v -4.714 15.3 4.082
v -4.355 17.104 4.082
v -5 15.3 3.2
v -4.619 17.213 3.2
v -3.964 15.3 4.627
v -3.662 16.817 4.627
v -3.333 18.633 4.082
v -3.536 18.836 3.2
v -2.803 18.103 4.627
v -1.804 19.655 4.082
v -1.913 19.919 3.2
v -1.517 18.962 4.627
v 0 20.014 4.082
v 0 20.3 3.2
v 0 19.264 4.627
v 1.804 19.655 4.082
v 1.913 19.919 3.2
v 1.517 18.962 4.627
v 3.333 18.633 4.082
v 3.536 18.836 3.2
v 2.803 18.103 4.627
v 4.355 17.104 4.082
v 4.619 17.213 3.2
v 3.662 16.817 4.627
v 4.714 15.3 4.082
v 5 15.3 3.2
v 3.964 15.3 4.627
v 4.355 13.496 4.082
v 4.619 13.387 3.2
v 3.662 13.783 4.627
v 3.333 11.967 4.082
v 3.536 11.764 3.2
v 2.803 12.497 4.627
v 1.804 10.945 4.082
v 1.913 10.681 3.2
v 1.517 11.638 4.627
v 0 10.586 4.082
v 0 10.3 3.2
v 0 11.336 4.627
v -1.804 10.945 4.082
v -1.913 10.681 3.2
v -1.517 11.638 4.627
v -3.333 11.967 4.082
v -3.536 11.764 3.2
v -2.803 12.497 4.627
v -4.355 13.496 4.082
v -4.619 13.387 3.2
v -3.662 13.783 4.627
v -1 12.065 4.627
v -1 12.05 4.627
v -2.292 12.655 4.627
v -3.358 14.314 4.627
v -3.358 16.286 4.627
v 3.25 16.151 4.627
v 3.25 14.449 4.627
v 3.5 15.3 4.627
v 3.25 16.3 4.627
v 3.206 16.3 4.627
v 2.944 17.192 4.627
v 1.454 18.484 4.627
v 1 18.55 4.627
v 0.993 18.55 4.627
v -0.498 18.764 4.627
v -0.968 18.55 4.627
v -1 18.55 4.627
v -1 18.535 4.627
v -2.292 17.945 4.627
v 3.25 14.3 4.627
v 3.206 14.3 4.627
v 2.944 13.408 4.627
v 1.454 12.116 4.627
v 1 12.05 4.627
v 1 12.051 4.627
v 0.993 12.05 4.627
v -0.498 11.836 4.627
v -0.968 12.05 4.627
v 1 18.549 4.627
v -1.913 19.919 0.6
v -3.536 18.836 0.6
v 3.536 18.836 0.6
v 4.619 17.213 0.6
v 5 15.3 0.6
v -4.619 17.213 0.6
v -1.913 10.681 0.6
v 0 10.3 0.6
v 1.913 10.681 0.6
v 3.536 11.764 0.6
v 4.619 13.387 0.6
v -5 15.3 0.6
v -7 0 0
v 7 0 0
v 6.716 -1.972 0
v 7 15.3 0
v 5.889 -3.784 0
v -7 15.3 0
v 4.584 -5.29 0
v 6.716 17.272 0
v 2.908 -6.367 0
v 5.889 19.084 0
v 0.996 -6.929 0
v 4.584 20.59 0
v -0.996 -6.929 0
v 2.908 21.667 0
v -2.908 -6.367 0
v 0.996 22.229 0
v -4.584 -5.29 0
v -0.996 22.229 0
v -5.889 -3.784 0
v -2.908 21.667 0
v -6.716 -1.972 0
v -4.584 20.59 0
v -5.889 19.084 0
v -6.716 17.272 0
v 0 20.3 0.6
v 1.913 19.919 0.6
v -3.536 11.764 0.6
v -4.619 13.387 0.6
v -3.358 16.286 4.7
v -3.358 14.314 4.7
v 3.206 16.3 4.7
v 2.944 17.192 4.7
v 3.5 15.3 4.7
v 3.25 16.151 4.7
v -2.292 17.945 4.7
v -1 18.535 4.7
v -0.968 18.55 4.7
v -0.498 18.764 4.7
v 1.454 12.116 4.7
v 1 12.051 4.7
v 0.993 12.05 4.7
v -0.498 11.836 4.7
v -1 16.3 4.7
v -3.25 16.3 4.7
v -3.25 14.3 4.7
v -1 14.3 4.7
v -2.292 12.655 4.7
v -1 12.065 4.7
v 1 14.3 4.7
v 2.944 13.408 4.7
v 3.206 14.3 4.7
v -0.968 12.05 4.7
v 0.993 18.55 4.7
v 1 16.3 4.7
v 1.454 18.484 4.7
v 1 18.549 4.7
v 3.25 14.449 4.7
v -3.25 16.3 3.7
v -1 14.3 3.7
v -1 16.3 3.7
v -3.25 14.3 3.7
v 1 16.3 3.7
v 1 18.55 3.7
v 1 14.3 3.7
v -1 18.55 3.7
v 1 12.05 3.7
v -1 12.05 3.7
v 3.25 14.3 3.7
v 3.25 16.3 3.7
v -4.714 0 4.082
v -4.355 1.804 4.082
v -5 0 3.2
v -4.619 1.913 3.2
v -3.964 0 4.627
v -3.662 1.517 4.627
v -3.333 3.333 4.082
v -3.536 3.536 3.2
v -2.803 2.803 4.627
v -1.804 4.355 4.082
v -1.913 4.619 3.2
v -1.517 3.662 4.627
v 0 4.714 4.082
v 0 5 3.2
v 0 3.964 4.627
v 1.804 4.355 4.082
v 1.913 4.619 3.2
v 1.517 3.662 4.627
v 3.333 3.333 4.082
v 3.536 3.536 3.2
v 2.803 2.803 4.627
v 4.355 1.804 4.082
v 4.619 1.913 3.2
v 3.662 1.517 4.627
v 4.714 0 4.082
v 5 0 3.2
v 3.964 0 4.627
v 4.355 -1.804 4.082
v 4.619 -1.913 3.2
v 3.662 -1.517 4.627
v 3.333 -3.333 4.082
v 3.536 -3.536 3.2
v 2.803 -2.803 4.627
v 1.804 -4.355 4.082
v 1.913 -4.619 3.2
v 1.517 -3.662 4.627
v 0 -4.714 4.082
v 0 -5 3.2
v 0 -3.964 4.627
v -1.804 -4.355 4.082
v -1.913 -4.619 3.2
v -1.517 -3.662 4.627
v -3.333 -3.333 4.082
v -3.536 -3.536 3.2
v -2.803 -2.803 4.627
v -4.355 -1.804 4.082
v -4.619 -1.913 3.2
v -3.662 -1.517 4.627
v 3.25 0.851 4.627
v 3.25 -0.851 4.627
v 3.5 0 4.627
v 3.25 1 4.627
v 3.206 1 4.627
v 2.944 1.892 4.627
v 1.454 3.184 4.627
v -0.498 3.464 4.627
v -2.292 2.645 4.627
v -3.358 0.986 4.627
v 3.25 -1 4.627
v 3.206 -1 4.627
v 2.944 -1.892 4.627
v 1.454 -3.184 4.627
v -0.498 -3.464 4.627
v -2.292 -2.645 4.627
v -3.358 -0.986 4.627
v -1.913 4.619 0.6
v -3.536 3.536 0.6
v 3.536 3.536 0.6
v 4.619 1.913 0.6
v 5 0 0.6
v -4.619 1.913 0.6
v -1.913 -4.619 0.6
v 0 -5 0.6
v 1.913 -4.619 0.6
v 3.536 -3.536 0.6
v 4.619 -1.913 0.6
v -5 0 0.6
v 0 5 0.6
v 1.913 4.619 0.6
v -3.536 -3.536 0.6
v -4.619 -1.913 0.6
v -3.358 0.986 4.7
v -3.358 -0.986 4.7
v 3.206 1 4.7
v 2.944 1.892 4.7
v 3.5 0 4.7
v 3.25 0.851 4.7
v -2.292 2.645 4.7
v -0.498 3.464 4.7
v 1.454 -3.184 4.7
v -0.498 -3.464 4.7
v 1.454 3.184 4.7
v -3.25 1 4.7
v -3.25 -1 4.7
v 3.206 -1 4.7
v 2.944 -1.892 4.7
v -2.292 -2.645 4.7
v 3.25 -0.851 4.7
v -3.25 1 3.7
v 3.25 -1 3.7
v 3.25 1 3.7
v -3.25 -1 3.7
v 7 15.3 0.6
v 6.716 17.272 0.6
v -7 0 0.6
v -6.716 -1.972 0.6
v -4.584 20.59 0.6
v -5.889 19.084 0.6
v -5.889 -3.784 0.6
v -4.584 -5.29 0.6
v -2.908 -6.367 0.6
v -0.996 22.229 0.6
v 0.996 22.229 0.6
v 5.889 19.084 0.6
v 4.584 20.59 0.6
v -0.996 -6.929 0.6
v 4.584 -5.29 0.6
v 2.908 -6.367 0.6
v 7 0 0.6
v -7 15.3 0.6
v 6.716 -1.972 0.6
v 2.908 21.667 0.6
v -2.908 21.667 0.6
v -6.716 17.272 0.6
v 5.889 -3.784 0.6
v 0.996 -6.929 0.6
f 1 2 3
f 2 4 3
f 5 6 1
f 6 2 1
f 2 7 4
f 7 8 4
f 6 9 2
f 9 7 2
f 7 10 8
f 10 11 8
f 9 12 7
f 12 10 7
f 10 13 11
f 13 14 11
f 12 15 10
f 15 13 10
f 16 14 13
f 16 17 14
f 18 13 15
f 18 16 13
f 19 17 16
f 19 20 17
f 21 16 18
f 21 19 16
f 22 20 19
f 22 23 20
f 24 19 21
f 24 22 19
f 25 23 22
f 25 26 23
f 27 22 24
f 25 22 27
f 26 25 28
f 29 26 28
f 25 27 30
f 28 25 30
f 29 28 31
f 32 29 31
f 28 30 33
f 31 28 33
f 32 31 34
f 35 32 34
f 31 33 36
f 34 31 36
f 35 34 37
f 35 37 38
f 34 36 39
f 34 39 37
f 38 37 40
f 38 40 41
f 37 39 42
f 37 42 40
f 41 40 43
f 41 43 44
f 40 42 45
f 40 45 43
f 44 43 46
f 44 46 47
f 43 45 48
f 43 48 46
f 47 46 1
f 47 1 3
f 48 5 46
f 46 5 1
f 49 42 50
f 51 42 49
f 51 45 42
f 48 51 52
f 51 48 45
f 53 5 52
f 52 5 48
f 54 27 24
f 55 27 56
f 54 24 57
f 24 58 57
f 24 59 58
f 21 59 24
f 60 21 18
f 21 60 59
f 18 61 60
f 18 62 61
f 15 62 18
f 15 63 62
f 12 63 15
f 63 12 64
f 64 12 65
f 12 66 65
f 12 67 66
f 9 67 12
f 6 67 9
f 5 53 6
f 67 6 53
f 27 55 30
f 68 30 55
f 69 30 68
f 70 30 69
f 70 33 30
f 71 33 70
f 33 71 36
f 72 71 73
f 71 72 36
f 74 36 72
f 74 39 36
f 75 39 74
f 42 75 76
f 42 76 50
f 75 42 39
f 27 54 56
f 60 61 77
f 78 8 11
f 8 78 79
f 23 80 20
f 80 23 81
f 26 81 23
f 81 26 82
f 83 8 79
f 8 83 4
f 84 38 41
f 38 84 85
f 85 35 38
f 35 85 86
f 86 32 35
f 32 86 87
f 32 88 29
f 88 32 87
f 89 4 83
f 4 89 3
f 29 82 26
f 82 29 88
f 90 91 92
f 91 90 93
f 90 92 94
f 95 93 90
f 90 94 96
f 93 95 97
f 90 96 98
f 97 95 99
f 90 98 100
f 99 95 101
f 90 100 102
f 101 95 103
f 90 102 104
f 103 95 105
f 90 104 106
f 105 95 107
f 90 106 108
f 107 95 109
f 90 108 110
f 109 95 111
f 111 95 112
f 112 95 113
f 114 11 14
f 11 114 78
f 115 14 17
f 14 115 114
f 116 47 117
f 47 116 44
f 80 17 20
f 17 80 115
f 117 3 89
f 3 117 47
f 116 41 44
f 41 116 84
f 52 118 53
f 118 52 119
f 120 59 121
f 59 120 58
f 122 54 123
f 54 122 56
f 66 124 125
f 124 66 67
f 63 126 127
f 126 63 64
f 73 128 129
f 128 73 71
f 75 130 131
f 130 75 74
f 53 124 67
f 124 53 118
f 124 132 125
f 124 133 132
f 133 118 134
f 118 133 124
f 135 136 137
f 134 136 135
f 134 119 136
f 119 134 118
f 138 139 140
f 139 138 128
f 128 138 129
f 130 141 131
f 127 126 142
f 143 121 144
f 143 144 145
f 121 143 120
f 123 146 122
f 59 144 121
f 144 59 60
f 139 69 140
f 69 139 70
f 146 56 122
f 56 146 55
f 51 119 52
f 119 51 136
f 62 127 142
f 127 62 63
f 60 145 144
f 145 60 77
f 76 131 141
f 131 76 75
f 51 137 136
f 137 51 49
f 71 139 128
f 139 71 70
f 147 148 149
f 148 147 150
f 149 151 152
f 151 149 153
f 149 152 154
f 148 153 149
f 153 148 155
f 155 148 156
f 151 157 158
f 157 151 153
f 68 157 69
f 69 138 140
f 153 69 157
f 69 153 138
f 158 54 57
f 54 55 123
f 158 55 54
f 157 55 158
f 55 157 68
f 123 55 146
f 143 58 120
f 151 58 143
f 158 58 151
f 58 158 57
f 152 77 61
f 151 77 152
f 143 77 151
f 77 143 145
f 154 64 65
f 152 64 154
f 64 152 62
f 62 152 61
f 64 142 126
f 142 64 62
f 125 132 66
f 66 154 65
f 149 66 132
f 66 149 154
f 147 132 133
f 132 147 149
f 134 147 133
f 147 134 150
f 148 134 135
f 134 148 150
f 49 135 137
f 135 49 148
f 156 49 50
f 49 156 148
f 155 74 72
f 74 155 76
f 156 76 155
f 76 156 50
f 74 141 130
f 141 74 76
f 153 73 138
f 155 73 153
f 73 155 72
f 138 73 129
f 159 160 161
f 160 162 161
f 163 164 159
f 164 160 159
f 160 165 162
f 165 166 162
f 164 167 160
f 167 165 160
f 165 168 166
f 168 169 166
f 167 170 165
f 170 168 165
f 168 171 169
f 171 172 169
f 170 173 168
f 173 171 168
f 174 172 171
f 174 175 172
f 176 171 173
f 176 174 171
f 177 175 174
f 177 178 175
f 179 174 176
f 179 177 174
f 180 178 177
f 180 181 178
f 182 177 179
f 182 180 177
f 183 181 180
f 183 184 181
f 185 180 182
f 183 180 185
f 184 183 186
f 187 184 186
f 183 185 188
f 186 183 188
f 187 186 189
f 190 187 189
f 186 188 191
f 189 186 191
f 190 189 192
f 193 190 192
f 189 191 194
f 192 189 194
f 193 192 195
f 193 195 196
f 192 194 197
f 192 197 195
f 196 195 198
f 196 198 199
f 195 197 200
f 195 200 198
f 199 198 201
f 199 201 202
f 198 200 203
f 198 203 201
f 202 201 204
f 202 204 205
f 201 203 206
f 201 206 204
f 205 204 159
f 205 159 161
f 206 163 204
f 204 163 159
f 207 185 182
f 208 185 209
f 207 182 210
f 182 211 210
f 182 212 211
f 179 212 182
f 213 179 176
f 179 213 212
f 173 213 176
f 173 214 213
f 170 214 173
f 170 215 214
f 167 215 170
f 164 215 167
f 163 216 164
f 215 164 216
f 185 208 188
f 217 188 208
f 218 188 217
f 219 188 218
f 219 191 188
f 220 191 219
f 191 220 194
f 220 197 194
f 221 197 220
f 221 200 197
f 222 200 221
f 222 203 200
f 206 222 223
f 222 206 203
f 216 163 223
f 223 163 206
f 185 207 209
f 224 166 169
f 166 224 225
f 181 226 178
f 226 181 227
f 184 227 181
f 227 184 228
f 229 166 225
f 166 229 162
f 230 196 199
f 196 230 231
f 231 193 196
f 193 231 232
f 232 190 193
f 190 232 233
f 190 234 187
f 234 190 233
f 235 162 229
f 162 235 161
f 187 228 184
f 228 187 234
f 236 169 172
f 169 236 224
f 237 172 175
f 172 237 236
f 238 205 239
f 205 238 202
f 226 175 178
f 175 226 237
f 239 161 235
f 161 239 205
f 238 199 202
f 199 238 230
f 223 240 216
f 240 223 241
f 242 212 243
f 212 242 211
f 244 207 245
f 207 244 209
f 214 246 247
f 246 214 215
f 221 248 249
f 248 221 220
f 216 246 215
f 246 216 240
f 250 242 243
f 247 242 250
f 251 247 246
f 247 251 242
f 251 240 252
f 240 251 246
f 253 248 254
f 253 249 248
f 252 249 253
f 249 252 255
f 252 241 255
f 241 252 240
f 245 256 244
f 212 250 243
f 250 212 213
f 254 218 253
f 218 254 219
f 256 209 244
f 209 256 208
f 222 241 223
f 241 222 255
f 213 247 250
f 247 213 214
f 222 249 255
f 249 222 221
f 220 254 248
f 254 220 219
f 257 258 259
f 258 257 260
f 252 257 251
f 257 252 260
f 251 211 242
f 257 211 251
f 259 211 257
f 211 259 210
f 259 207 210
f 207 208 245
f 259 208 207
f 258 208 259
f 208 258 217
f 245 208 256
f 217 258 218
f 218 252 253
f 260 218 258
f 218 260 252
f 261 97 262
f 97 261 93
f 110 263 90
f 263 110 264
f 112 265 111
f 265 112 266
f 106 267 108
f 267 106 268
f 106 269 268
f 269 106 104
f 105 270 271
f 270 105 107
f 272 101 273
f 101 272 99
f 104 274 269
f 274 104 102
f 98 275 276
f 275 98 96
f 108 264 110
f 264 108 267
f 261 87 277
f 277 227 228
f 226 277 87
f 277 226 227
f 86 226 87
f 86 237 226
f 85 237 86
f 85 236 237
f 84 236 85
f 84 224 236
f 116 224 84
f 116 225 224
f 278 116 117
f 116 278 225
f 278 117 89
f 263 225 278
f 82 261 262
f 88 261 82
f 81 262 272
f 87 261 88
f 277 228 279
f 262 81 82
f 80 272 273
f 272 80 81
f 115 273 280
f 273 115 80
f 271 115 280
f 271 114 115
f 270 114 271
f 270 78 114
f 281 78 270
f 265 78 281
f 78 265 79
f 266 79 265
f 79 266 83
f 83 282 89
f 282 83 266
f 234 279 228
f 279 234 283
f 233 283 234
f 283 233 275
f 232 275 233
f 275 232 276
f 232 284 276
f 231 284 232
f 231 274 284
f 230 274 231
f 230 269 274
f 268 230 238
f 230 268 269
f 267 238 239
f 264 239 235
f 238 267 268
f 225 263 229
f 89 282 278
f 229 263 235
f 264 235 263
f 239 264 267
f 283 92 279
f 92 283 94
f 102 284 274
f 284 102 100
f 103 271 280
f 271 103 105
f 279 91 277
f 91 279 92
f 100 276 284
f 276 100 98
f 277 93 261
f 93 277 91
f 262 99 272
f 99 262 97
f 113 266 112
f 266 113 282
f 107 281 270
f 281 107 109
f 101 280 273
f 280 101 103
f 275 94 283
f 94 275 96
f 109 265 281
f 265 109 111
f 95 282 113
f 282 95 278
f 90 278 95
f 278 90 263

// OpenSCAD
// file: tvRemoteControl-Buttons.scad
pitch=2.55;
width = 10;
thickness=0.6;
height=thickness + 4.1;
extra=2;
roundness=1.5;
textHeight=1;

module button(x,y)
{
    translate( [x*pitch, y*pitch] ) {
        difference() {
            union() {
                translate( [0,0,height-roundness] ) rotate_extrude( angle = 360, convexity = 6 ) {
                    translate( [width/2-roundness,0] ) circle( r=roundness, $fn=10 );
                }
                cylinder( d=width, h=height-roundness );
                cylinder( d=width-roundness*2, h=height );
            }
            translate( [0,0,height-textHeight] ) linear_extrude( textHeight+1 ) children();
        }
    }
}

module base(x,y)
{
    translate( [x*pitch, y*pitch] ) {
        cylinder( d=width+extra*2, thickness );
    }
}

module letter( t )
{
    text( t=t, halign="center", valign="center" );
}

module arrow()
{
    circle( d= width-roundness-2, $fn=3 );
}

module minus()
{
    square( [width-roundness-2, 2], center=true );
}

module plus()
{
    minus();
    rotate( 90 ) minus();
}
// main file
use <tvRemoteControl-Buttons.scad>;


module volume()
{    
    button(0,6) plus();
    button(0,0) minus();
    
    hull() {
        base(0,6);
        base(0,0);
    }
}

volume();
